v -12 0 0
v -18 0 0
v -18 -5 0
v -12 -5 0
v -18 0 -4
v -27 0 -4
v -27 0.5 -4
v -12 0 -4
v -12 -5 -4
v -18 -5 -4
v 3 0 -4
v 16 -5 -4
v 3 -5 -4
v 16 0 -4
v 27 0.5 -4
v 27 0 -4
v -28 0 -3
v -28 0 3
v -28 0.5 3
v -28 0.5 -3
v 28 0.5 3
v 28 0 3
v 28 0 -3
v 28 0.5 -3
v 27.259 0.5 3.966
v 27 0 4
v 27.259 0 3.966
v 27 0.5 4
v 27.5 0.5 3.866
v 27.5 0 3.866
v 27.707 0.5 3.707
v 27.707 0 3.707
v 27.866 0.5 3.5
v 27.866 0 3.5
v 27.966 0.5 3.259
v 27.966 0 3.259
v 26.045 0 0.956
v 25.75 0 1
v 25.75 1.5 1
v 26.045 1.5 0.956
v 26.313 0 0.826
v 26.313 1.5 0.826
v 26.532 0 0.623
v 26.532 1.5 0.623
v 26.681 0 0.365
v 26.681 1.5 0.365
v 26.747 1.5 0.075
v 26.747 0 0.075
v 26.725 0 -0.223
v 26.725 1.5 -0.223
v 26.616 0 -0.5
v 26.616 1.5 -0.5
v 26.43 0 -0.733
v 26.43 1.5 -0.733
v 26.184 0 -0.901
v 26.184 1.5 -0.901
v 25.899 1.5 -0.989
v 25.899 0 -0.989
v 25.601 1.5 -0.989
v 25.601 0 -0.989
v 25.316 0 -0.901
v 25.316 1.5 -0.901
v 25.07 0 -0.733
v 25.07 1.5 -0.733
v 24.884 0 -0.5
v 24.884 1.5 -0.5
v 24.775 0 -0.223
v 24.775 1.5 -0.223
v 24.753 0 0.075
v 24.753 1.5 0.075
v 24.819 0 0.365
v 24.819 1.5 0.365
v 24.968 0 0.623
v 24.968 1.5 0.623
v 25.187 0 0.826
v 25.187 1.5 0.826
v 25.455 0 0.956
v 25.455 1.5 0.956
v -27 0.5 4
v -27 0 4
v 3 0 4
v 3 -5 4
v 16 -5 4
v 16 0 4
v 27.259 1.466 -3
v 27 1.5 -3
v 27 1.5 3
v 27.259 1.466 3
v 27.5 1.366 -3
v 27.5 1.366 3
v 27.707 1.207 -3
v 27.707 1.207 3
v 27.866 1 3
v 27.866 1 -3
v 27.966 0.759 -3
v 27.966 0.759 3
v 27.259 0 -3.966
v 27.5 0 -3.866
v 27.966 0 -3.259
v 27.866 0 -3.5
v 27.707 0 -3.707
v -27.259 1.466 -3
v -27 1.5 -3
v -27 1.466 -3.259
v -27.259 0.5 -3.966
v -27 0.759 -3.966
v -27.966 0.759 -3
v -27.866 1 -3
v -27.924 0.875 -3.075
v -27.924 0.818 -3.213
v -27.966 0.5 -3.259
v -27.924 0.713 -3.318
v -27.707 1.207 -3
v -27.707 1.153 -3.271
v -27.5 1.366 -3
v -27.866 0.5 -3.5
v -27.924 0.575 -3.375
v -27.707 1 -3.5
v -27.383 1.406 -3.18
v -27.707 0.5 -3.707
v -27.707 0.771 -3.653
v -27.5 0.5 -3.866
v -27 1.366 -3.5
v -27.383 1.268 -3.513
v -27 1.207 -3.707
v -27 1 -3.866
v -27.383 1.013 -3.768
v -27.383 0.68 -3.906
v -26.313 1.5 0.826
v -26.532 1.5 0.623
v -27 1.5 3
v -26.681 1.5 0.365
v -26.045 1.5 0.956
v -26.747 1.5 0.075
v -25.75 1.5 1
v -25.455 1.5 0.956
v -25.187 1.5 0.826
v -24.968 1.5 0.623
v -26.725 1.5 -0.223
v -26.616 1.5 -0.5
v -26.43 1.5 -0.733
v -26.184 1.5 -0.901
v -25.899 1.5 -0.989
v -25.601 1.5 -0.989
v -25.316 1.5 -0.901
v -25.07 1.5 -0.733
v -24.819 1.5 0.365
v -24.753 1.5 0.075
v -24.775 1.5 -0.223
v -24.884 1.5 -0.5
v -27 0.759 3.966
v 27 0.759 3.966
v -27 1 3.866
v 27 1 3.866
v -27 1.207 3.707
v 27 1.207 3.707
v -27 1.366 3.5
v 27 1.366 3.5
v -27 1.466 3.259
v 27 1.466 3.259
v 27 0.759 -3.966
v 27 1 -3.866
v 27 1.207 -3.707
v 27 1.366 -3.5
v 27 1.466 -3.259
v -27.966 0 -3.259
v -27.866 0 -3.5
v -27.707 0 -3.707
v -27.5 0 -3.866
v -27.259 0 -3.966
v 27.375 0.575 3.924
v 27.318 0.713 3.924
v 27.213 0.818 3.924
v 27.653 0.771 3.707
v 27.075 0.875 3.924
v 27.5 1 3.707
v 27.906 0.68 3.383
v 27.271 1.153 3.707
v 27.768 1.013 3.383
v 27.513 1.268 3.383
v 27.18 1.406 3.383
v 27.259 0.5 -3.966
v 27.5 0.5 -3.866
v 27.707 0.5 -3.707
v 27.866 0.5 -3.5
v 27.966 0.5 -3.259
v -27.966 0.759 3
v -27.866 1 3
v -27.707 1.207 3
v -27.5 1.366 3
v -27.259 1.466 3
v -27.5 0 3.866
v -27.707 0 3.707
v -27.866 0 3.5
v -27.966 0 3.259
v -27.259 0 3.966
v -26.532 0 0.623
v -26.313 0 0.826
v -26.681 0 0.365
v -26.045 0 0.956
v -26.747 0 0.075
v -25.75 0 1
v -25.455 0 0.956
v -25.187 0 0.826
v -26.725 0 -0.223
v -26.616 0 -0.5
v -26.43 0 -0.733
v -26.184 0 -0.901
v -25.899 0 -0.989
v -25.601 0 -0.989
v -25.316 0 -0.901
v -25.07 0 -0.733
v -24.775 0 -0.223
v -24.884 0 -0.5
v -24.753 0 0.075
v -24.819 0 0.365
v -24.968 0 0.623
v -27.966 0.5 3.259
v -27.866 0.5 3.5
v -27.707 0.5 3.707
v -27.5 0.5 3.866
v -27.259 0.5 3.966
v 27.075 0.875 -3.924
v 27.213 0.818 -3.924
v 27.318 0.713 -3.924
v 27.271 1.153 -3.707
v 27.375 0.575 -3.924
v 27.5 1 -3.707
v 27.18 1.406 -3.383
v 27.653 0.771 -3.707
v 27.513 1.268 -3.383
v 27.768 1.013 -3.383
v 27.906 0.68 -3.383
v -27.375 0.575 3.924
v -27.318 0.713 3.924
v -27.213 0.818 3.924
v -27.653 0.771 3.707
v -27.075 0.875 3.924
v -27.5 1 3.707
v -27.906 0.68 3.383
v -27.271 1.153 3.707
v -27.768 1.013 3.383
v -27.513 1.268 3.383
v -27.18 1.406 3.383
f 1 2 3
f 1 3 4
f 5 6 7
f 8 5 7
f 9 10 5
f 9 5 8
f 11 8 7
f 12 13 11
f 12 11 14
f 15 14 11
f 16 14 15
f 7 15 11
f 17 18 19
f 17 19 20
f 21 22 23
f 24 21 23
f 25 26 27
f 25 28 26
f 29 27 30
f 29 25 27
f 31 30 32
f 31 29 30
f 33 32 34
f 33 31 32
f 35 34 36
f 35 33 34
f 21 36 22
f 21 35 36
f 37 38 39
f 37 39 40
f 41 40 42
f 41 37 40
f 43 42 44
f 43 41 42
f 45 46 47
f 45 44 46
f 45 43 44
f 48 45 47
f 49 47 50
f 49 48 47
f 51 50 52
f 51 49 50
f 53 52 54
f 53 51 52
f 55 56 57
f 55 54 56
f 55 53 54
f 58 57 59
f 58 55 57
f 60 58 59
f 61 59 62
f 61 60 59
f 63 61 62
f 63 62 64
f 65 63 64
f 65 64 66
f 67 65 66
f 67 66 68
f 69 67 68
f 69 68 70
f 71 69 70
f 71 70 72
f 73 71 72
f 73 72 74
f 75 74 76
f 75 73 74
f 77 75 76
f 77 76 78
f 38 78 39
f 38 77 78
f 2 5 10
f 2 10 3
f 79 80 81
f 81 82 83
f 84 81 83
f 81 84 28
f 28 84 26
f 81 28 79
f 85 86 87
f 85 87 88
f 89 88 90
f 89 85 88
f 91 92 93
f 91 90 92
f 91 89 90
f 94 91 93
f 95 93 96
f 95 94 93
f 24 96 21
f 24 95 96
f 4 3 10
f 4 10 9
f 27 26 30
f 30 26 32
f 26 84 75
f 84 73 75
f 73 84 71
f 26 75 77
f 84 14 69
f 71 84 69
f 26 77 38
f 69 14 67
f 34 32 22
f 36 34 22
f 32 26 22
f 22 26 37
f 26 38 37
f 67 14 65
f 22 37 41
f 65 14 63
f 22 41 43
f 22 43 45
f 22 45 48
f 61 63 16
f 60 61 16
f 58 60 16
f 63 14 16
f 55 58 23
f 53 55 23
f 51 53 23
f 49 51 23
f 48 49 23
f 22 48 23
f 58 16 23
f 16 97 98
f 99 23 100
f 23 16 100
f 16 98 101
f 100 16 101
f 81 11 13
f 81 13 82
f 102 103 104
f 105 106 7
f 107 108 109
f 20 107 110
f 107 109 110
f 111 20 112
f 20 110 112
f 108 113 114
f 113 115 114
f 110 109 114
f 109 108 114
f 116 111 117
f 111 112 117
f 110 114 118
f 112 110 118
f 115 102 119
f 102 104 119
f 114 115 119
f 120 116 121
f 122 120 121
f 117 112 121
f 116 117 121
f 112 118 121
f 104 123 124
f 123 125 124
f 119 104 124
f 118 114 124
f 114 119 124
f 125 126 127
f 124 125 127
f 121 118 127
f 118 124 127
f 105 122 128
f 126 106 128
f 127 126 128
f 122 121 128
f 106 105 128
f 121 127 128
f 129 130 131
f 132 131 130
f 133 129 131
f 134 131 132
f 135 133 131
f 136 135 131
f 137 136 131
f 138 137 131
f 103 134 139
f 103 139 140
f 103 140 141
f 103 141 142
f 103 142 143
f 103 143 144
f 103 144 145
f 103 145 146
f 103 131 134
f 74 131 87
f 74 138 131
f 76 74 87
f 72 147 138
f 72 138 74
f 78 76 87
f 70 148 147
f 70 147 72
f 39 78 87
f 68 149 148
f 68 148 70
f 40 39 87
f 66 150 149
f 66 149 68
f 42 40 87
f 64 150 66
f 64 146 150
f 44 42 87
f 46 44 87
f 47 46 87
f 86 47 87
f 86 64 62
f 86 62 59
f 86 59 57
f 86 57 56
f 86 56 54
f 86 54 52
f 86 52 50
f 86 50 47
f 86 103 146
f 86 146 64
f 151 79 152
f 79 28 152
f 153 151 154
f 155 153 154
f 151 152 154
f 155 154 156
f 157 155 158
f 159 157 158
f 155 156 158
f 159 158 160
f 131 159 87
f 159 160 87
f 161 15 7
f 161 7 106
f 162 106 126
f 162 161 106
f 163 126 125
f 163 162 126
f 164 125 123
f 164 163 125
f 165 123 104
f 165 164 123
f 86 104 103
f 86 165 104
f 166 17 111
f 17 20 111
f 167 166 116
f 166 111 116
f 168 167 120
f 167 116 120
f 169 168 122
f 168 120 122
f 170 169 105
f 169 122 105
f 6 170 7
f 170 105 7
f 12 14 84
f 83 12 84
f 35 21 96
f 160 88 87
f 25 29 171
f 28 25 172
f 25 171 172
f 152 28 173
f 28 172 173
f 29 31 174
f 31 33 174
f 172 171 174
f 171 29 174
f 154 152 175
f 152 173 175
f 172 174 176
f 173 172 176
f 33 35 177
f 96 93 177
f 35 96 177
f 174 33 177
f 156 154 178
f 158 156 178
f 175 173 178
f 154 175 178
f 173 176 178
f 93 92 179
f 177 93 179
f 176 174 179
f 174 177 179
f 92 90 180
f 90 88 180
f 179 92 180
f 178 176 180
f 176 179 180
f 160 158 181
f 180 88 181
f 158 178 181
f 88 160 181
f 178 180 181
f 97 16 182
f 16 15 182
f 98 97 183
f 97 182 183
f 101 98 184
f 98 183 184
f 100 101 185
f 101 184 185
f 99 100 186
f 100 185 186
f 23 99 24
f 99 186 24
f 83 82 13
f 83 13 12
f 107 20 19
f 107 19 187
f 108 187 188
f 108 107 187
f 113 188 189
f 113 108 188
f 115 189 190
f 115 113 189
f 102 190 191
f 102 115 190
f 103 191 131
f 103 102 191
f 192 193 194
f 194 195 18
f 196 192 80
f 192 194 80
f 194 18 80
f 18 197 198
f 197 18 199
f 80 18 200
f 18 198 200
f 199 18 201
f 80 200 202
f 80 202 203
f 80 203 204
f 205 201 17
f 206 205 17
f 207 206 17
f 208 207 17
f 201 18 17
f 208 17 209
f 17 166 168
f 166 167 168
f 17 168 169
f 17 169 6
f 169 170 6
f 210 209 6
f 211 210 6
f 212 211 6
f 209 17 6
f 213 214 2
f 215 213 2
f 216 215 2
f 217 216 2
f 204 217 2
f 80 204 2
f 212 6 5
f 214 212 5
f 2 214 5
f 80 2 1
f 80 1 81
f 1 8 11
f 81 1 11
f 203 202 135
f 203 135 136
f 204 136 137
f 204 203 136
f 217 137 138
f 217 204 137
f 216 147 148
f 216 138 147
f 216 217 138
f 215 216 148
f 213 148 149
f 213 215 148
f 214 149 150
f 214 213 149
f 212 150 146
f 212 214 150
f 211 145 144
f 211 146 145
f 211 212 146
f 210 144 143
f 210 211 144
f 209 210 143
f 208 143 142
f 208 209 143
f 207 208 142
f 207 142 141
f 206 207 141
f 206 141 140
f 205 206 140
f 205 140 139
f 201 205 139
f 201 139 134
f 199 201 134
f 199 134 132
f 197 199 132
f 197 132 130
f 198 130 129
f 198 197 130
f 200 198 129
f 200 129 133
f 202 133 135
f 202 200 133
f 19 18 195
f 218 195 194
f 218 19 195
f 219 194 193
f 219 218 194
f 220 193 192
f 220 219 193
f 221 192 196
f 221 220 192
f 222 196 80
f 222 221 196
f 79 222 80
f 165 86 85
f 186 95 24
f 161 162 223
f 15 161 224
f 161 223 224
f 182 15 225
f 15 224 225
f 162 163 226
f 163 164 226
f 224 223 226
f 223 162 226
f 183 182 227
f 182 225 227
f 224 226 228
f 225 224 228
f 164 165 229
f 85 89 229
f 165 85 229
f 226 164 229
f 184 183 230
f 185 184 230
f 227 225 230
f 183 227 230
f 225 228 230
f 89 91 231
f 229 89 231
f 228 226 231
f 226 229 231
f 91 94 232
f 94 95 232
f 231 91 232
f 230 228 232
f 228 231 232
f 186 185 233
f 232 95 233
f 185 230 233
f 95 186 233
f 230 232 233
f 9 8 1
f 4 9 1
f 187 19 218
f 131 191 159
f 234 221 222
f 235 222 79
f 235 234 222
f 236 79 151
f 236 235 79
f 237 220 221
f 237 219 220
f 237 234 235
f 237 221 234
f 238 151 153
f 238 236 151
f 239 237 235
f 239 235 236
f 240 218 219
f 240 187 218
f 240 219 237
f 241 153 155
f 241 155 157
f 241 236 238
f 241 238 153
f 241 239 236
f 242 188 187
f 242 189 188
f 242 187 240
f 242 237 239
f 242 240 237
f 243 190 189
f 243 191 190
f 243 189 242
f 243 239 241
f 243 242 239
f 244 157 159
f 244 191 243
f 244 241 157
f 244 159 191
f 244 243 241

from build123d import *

# Parameters (mm, degrees)
SKETCH1_W               = 56
SKETCH1_H               = 8
BOSS_EXTRUDE1_DEPTH     = 1.5
CUT_EXTRUDE1_DEPTH      = 29.324018077
CUT_EXTRUDE1_DEPTH_BACK = 29.324018077
SKETCH2_R               = 1
FILLET1_R               = 1
SKETCH3_W               = 13
SKETCH3_H               = 8
SKETCH3_W_2             = 6
SKETCH3_H_2             = 4
BOSS_EXTRUDE2_DEPTH     = 5


with BuildPart() as part:
    # Sketch1 → Boss-Extrude1 (new body)
    with BuildSketch(Plane(origin=(0, 0, 0), x_dir=(1, 0, 0), z_dir=(0, 1, 0))):
        Rectangle(SKETCH1_W, SKETCH1_H)
    extrude(amount=BOSS_EXTRUDE1_DEPTH)

    # Sketch2 → Cut-Extrude1 (cut, two sides: drawn at the far end of the back side and taken through both)
    with BuildSketch(Plane(origin=(0, 1.5, 0), x_dir=(1, 0, 0), z_dir=(0, 1, 0)).offset(-CUT_EXTRUDE1_DEPTH_BACK)):
        with Locations(Location((-25.75, 0, 0), (0, 0, 270))):
            Circle(SKETCH2_R)
        with Locations(Location((25.75, 0, 0), (0, 0, 270))):
            Circle(SKETCH2_R)
    extrude(amount=CUT_EXTRUDE1_DEPTH + CUT_EXTRUDE1_DEPTH_BACK, mode=Mode.SUBTRACT)

    # Fillet1
    fillet1_edges = [part.edges().sort_by_distance(p)[0] for p in [
        (28, 1.5, 0),
        (0, 1.5, -4),
        (-28, 1.5, 0),
        (-28, 0.75, -4),
        (28, 0.75, -4),
        (28, 0.75, 4),
        (-28, 0.75, 4),
        (0, 1.5, 4),
    ]]
    fillet(fillet1_edges, radius=FILLET1_R)

    # Sketch3 → Boss-Extrude2 (add)
    with BuildSketch(Plane.XZ):
        with Locations((9.5, 0)):
            Rectangle(SKETCH3_W, SKETCH3_H)
        with Locations((-15, -2)):
            Rectangle(SKETCH3_W_2, SKETCH3_H_2)
    extrude(amount=BOSS_EXTRUDE2_DEPTH)


solid = part.part
